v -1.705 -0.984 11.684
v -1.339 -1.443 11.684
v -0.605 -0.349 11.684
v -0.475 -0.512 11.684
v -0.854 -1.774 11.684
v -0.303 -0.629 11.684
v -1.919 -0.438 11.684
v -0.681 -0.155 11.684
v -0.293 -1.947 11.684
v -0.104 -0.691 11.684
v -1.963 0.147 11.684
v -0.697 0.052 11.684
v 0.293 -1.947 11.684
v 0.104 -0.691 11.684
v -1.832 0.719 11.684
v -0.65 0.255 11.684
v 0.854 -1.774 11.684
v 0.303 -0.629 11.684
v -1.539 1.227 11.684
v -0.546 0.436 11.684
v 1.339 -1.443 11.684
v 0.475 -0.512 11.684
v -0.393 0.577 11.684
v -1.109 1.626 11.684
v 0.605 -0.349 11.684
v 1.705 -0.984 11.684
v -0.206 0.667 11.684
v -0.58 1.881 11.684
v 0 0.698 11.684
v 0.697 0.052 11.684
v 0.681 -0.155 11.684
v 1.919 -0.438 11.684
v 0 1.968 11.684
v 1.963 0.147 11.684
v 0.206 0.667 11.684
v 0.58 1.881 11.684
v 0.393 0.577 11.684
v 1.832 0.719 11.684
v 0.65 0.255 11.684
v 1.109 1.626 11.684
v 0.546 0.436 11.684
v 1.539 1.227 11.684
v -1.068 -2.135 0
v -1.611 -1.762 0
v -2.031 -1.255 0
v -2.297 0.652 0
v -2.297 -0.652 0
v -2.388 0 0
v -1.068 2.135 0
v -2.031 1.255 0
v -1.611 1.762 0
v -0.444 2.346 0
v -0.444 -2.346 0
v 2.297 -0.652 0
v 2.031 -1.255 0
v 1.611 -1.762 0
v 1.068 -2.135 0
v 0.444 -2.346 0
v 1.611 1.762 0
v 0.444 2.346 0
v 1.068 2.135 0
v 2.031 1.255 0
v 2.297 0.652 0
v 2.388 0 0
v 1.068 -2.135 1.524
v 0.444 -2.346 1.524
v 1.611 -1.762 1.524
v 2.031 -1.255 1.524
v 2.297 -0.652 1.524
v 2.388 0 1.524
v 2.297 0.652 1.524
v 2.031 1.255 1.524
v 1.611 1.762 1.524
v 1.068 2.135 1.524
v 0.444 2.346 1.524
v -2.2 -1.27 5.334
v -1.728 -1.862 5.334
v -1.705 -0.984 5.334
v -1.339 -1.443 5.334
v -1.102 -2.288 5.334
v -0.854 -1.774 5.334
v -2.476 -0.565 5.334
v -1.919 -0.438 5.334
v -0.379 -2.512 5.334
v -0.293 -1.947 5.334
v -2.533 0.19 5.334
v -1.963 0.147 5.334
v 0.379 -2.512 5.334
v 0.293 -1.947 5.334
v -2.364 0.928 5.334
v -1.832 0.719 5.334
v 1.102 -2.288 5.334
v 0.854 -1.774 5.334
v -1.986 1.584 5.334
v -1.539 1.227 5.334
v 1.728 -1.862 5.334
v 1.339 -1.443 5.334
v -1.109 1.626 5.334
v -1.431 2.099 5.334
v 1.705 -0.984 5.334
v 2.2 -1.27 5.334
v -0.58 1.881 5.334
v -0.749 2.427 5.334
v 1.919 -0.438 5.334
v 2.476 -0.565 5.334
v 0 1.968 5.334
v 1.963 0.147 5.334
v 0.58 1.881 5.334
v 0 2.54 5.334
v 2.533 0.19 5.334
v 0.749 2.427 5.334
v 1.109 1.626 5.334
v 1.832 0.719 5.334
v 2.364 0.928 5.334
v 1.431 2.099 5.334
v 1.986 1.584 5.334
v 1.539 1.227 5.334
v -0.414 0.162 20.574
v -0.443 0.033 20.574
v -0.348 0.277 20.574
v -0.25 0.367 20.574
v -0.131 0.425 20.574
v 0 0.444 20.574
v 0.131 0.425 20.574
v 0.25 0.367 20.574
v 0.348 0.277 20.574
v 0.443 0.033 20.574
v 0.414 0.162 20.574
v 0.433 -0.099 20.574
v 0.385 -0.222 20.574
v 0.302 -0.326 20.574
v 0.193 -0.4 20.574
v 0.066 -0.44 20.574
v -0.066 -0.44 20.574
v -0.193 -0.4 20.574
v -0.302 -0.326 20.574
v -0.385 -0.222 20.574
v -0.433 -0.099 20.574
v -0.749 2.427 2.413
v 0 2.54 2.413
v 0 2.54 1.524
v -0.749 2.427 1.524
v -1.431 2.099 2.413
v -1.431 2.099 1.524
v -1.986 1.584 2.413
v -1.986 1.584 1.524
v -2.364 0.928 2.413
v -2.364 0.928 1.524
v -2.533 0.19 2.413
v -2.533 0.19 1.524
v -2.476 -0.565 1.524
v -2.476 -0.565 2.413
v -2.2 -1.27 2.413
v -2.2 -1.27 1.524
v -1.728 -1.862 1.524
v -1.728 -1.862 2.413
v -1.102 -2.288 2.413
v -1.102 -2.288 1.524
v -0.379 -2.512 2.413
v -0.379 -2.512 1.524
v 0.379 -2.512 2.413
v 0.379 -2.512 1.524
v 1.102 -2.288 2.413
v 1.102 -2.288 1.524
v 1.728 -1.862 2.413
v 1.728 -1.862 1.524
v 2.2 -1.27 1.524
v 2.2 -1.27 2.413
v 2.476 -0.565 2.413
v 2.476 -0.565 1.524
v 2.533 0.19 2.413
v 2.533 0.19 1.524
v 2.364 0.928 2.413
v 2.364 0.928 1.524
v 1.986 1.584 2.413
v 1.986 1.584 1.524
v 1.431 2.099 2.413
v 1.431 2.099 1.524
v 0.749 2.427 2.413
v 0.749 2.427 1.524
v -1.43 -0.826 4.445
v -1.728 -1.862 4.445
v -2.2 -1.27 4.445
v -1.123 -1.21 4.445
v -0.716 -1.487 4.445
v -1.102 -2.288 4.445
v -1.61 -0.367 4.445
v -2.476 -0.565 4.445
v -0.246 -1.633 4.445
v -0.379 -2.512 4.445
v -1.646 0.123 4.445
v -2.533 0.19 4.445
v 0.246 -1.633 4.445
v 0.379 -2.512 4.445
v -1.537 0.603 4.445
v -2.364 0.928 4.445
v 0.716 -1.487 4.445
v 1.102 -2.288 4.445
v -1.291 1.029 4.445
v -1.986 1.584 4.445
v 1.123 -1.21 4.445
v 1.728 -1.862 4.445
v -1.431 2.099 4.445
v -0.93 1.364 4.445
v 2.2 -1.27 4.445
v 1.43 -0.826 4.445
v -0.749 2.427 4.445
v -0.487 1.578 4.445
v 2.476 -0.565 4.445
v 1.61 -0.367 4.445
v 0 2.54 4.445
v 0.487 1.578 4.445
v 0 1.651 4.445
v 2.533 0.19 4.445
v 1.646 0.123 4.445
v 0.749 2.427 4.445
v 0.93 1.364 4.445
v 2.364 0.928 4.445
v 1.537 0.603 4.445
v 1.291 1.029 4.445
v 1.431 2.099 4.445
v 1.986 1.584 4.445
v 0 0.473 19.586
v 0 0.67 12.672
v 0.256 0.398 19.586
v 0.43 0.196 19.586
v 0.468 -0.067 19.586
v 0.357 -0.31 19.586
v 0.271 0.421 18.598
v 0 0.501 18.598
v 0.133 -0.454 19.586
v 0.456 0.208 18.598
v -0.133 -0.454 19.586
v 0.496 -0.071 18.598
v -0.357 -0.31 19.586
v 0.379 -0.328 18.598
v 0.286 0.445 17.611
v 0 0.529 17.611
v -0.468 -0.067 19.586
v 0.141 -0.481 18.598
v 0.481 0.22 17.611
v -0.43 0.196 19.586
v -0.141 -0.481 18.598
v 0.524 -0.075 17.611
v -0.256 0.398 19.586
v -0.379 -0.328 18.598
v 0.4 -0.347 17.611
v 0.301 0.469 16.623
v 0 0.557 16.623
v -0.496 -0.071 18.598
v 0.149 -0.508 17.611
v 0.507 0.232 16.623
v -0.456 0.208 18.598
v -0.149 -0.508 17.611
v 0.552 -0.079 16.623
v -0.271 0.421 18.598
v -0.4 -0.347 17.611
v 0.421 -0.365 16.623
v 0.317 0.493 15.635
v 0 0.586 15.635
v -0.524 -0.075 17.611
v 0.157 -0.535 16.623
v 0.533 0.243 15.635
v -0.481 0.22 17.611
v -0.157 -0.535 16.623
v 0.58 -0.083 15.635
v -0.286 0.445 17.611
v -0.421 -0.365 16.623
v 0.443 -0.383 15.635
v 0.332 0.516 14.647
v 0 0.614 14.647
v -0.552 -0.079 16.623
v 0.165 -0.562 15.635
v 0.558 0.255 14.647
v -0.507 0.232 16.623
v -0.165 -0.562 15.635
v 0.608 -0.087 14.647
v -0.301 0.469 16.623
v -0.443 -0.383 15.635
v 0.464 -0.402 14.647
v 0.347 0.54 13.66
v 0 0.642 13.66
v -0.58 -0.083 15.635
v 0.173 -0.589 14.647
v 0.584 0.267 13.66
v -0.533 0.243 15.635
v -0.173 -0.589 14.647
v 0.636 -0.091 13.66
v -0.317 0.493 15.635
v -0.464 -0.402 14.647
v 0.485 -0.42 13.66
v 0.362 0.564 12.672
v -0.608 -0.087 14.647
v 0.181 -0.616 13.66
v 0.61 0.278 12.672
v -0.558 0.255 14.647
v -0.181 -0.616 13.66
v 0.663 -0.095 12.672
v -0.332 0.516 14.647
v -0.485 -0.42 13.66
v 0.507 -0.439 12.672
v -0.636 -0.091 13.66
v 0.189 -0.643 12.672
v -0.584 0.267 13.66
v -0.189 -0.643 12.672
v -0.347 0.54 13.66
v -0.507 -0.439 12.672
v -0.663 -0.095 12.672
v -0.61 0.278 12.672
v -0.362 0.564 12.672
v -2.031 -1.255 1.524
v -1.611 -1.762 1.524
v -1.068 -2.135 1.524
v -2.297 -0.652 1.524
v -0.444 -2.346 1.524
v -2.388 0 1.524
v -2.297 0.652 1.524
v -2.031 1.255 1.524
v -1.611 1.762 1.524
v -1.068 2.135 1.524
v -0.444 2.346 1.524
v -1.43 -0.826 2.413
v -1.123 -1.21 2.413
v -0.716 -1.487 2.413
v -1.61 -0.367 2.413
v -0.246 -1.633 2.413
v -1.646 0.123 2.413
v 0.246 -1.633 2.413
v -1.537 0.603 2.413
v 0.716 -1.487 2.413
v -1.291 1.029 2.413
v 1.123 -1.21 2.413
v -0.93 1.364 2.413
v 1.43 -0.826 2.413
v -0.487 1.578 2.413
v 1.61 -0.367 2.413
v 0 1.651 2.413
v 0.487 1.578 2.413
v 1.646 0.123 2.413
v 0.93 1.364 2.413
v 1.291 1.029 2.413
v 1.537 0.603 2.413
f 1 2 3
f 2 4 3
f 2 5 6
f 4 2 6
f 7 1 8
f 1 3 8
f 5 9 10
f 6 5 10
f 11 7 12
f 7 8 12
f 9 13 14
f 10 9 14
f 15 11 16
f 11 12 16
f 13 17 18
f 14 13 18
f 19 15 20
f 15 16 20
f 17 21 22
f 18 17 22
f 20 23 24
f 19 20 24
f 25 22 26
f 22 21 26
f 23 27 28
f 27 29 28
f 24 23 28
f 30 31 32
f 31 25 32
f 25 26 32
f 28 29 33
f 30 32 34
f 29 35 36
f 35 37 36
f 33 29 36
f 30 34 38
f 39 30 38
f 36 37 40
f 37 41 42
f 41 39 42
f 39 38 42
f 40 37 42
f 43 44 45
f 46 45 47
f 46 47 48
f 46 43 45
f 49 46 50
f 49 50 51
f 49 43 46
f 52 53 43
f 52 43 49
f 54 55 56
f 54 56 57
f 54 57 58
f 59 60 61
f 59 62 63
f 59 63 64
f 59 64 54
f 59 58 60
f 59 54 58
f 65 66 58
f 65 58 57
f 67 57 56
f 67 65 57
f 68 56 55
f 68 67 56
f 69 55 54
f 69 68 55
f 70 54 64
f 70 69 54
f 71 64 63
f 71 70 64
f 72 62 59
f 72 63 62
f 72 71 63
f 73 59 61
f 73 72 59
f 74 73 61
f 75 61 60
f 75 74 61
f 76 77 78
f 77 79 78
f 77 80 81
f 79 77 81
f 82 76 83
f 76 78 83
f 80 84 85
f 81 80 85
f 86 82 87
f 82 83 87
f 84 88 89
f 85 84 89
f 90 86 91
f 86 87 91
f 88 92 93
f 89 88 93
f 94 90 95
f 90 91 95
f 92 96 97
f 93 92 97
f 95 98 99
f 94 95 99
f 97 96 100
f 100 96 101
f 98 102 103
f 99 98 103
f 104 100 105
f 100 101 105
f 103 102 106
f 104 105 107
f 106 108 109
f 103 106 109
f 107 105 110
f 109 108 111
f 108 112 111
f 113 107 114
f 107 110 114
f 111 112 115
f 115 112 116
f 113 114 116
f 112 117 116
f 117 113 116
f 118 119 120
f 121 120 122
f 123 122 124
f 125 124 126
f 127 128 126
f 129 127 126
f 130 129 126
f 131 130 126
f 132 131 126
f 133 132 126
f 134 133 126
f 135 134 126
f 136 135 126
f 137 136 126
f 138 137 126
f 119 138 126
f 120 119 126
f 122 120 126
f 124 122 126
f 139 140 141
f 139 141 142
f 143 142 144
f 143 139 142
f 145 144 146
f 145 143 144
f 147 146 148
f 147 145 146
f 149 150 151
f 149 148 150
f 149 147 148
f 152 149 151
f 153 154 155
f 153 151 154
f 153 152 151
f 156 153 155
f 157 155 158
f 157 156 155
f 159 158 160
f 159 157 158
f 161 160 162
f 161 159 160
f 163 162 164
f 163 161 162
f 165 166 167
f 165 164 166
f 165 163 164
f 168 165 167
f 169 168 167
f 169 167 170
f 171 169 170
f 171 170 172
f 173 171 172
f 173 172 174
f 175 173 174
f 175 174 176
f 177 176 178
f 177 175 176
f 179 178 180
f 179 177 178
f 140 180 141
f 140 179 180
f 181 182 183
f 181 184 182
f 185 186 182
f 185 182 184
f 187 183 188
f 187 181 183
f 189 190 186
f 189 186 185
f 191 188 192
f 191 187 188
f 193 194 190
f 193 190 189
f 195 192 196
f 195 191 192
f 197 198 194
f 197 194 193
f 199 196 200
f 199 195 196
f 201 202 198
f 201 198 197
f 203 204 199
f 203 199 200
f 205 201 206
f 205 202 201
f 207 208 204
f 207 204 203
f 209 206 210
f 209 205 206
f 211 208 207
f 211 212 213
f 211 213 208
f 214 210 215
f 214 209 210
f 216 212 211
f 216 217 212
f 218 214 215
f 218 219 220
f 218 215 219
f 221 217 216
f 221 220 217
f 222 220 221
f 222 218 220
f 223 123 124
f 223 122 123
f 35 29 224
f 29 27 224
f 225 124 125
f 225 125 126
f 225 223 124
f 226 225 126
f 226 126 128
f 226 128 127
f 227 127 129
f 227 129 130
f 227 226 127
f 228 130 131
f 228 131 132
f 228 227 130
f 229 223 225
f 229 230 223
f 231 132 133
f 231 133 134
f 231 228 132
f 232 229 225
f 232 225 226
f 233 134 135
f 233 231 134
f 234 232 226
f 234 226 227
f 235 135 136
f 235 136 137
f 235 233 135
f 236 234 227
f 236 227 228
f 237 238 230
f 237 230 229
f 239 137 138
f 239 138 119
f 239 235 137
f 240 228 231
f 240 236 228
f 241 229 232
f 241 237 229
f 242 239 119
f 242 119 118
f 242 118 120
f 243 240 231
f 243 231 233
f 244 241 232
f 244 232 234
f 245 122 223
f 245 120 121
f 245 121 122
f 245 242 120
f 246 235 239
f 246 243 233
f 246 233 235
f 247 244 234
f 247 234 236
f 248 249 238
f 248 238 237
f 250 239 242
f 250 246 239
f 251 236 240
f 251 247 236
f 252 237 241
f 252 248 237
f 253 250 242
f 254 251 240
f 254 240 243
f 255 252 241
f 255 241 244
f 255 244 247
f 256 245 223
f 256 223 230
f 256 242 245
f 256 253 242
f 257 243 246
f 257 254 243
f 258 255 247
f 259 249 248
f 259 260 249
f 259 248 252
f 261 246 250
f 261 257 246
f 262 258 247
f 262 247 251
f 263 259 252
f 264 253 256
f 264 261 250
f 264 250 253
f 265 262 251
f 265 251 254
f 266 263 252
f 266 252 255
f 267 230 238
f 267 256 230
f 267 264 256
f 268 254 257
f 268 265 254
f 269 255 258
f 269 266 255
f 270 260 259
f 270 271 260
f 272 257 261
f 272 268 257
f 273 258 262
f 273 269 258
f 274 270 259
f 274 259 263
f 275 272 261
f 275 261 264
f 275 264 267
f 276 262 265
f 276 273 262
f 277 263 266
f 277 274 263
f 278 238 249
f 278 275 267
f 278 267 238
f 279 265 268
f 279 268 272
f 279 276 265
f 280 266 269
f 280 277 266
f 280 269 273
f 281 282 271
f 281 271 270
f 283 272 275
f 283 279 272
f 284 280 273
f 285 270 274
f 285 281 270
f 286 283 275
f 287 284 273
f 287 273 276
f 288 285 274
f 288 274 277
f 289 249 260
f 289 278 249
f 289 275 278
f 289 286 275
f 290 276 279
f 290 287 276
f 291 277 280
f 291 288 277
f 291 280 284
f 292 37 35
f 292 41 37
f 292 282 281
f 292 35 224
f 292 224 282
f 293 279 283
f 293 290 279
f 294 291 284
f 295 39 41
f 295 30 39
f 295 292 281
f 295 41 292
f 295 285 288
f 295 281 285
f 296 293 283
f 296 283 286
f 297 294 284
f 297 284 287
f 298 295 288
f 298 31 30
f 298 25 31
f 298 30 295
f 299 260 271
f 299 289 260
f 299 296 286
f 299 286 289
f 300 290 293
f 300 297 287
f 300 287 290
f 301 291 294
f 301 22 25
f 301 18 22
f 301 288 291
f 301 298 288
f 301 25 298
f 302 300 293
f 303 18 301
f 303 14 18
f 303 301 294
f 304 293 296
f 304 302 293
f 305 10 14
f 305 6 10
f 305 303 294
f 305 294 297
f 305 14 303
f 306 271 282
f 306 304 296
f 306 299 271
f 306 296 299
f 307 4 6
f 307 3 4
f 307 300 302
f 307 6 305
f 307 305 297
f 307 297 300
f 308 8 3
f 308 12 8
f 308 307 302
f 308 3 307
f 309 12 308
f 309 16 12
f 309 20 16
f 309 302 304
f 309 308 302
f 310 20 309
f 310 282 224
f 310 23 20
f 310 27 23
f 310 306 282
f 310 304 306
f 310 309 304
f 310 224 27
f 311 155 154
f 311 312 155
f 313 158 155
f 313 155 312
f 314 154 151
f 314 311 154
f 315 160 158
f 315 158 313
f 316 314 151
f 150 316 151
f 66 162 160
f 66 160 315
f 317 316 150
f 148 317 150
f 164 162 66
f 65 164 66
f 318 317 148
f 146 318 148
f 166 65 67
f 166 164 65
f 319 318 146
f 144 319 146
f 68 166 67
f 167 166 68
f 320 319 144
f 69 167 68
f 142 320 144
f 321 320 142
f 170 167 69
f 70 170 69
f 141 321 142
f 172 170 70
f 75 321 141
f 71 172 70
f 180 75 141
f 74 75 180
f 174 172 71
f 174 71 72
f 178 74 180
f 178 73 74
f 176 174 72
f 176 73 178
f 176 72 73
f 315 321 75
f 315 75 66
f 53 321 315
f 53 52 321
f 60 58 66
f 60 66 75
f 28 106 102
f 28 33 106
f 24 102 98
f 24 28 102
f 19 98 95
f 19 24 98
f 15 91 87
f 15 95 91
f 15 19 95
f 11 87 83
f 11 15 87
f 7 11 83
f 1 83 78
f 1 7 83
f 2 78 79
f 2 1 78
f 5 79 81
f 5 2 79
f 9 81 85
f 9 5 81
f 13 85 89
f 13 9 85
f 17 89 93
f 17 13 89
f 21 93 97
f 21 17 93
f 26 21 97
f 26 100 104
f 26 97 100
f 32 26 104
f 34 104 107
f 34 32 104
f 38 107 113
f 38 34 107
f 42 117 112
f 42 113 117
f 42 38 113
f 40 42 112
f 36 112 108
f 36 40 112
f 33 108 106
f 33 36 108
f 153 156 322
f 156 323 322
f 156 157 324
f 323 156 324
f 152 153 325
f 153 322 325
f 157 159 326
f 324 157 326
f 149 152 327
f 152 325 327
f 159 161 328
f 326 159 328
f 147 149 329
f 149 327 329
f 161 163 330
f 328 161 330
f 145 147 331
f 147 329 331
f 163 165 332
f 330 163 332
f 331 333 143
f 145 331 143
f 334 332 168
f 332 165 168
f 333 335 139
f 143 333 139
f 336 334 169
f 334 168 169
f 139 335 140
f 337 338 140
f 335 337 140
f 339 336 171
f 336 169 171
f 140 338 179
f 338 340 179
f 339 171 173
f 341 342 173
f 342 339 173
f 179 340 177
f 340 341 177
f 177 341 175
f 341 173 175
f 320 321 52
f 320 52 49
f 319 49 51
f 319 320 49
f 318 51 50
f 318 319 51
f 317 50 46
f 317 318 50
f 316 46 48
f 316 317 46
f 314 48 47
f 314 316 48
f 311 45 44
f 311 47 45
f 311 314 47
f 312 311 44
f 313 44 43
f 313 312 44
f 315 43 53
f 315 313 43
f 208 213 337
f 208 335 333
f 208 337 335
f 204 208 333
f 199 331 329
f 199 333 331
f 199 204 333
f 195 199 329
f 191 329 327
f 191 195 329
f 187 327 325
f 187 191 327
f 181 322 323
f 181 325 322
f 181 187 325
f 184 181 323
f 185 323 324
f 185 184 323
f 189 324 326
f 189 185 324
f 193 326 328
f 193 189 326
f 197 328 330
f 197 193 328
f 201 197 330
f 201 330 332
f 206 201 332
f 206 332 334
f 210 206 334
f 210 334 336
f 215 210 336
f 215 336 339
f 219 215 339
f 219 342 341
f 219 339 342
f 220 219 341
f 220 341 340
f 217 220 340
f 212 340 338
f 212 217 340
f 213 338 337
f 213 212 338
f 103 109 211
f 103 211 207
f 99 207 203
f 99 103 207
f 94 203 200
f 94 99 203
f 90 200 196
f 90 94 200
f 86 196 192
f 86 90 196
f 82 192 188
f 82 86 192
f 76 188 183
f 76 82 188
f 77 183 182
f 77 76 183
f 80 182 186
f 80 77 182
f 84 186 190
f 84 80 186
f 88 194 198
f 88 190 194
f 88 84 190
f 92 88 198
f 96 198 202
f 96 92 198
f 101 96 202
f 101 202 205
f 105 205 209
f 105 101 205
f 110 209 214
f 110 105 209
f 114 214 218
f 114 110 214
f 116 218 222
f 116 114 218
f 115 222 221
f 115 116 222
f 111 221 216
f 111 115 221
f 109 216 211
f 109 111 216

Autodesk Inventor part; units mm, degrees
ref_plane "YZ Plane" through (0, 0, 0) normal (1, 0, 0) x (0, 1, 0)
ref_plane "XZ Plane" through (0, 0, 0) normal (0, 1, 0) x (-1, 0, 0)
ref_plane "XY Plane" through (0, 0, 0) normal (0, 0, 1) x (1, 0, 0)
sketch "Sketch1" plane through (0, 0, 0) normal (1, 0, 0) x (0, 1, 0)
  line L0 (0, 0) -> (0, -2.5116) construction
  line L1 (0, 0) -> (2.3876, 0)
  line L2 (2.3876, 0) -> (2.3876, 1.524)
  line L3 (2.3876, 1.524) -> (2.54, 1.524)
  line L4 (2.54, 1.524) -> (2.54, 2.413)
  line L5 (2.54, 2.413) -> (1.651, 2.413)
  line L6 (1.651, 2.413) -> (1.651, 4.445)
  line L7 (1.651, 4.445) -> (2.54, 4.445)
  line L8 (2.54, 4.445) -> (2.54, 5.334)
  line L9 (2.54, 5.334) -> (1.9685, 5.334)
  line L10 (1.9685, 5.334) -> (1.9685, 11.684)
  line L11 (1.9685, 11.684) -> (0.6985, 11.684)
  line L12 (0.6985, 11.684) -> (0.4445, 20.574)
  line L13 (0.4445, 20.574) -> (0, 20.574)
  line L14 (0, 20.574) -> (0, 0)
  dimension "d0" = 4.7752
  dimension "d2" = 5.08
  dimension "d3" = 3.302
  dimension "d4" = 3.937
  dimension "d5" = 1.397
  dimension "d6" = 0.889
  dimension "d7" = 1.524
  dimension "d8" = 2.413
  dimension "d9" = 4.445
  dimension "d10" = 5.334
  dimension "d11" = 11.684
  dimension "d12" = 20.574
revolve "Revolution1" add sketch "Sketch1" angle 360 about axis through (0, 0, 0) along (0, 0, -1)
sketch "Sketch2" plane through (0, 0, 0) normal (0, 0, -1) x (-1, 0, 0)
  circle A0 centre (0, 0) radius 2.3876 projected
  line L0 (-0.4445, 2.3876) -> (0.4445, 2.3876)
  line L1 (0.4445, 2.3876) -> (0.4445, -2.3876)
  line L2 (0.4445, -2.3876) -> (-0.4445, -2.3876)
  line L3 (-0.4445, -2.3876) -> (-0.4445, 2.3876)
  dimension "d14" = 0.889
  dimension "d16" = 0.4445
extrude "Extrusion1" cut sketch "Sketch2" against normal blind 1.524 contours L1 A0 L3 | A0 L0 L1 | L1 L2 A0 | A0 L3 L0 | L2 L3 A0
thread "Thread1" size "8-32 UNC" class "2A" standard "ANSI Unified Screw Threads" full length
equation "\"d16\" = 0.5 * d14"
properties part number "Fuel Intake Adjuster Pin"
